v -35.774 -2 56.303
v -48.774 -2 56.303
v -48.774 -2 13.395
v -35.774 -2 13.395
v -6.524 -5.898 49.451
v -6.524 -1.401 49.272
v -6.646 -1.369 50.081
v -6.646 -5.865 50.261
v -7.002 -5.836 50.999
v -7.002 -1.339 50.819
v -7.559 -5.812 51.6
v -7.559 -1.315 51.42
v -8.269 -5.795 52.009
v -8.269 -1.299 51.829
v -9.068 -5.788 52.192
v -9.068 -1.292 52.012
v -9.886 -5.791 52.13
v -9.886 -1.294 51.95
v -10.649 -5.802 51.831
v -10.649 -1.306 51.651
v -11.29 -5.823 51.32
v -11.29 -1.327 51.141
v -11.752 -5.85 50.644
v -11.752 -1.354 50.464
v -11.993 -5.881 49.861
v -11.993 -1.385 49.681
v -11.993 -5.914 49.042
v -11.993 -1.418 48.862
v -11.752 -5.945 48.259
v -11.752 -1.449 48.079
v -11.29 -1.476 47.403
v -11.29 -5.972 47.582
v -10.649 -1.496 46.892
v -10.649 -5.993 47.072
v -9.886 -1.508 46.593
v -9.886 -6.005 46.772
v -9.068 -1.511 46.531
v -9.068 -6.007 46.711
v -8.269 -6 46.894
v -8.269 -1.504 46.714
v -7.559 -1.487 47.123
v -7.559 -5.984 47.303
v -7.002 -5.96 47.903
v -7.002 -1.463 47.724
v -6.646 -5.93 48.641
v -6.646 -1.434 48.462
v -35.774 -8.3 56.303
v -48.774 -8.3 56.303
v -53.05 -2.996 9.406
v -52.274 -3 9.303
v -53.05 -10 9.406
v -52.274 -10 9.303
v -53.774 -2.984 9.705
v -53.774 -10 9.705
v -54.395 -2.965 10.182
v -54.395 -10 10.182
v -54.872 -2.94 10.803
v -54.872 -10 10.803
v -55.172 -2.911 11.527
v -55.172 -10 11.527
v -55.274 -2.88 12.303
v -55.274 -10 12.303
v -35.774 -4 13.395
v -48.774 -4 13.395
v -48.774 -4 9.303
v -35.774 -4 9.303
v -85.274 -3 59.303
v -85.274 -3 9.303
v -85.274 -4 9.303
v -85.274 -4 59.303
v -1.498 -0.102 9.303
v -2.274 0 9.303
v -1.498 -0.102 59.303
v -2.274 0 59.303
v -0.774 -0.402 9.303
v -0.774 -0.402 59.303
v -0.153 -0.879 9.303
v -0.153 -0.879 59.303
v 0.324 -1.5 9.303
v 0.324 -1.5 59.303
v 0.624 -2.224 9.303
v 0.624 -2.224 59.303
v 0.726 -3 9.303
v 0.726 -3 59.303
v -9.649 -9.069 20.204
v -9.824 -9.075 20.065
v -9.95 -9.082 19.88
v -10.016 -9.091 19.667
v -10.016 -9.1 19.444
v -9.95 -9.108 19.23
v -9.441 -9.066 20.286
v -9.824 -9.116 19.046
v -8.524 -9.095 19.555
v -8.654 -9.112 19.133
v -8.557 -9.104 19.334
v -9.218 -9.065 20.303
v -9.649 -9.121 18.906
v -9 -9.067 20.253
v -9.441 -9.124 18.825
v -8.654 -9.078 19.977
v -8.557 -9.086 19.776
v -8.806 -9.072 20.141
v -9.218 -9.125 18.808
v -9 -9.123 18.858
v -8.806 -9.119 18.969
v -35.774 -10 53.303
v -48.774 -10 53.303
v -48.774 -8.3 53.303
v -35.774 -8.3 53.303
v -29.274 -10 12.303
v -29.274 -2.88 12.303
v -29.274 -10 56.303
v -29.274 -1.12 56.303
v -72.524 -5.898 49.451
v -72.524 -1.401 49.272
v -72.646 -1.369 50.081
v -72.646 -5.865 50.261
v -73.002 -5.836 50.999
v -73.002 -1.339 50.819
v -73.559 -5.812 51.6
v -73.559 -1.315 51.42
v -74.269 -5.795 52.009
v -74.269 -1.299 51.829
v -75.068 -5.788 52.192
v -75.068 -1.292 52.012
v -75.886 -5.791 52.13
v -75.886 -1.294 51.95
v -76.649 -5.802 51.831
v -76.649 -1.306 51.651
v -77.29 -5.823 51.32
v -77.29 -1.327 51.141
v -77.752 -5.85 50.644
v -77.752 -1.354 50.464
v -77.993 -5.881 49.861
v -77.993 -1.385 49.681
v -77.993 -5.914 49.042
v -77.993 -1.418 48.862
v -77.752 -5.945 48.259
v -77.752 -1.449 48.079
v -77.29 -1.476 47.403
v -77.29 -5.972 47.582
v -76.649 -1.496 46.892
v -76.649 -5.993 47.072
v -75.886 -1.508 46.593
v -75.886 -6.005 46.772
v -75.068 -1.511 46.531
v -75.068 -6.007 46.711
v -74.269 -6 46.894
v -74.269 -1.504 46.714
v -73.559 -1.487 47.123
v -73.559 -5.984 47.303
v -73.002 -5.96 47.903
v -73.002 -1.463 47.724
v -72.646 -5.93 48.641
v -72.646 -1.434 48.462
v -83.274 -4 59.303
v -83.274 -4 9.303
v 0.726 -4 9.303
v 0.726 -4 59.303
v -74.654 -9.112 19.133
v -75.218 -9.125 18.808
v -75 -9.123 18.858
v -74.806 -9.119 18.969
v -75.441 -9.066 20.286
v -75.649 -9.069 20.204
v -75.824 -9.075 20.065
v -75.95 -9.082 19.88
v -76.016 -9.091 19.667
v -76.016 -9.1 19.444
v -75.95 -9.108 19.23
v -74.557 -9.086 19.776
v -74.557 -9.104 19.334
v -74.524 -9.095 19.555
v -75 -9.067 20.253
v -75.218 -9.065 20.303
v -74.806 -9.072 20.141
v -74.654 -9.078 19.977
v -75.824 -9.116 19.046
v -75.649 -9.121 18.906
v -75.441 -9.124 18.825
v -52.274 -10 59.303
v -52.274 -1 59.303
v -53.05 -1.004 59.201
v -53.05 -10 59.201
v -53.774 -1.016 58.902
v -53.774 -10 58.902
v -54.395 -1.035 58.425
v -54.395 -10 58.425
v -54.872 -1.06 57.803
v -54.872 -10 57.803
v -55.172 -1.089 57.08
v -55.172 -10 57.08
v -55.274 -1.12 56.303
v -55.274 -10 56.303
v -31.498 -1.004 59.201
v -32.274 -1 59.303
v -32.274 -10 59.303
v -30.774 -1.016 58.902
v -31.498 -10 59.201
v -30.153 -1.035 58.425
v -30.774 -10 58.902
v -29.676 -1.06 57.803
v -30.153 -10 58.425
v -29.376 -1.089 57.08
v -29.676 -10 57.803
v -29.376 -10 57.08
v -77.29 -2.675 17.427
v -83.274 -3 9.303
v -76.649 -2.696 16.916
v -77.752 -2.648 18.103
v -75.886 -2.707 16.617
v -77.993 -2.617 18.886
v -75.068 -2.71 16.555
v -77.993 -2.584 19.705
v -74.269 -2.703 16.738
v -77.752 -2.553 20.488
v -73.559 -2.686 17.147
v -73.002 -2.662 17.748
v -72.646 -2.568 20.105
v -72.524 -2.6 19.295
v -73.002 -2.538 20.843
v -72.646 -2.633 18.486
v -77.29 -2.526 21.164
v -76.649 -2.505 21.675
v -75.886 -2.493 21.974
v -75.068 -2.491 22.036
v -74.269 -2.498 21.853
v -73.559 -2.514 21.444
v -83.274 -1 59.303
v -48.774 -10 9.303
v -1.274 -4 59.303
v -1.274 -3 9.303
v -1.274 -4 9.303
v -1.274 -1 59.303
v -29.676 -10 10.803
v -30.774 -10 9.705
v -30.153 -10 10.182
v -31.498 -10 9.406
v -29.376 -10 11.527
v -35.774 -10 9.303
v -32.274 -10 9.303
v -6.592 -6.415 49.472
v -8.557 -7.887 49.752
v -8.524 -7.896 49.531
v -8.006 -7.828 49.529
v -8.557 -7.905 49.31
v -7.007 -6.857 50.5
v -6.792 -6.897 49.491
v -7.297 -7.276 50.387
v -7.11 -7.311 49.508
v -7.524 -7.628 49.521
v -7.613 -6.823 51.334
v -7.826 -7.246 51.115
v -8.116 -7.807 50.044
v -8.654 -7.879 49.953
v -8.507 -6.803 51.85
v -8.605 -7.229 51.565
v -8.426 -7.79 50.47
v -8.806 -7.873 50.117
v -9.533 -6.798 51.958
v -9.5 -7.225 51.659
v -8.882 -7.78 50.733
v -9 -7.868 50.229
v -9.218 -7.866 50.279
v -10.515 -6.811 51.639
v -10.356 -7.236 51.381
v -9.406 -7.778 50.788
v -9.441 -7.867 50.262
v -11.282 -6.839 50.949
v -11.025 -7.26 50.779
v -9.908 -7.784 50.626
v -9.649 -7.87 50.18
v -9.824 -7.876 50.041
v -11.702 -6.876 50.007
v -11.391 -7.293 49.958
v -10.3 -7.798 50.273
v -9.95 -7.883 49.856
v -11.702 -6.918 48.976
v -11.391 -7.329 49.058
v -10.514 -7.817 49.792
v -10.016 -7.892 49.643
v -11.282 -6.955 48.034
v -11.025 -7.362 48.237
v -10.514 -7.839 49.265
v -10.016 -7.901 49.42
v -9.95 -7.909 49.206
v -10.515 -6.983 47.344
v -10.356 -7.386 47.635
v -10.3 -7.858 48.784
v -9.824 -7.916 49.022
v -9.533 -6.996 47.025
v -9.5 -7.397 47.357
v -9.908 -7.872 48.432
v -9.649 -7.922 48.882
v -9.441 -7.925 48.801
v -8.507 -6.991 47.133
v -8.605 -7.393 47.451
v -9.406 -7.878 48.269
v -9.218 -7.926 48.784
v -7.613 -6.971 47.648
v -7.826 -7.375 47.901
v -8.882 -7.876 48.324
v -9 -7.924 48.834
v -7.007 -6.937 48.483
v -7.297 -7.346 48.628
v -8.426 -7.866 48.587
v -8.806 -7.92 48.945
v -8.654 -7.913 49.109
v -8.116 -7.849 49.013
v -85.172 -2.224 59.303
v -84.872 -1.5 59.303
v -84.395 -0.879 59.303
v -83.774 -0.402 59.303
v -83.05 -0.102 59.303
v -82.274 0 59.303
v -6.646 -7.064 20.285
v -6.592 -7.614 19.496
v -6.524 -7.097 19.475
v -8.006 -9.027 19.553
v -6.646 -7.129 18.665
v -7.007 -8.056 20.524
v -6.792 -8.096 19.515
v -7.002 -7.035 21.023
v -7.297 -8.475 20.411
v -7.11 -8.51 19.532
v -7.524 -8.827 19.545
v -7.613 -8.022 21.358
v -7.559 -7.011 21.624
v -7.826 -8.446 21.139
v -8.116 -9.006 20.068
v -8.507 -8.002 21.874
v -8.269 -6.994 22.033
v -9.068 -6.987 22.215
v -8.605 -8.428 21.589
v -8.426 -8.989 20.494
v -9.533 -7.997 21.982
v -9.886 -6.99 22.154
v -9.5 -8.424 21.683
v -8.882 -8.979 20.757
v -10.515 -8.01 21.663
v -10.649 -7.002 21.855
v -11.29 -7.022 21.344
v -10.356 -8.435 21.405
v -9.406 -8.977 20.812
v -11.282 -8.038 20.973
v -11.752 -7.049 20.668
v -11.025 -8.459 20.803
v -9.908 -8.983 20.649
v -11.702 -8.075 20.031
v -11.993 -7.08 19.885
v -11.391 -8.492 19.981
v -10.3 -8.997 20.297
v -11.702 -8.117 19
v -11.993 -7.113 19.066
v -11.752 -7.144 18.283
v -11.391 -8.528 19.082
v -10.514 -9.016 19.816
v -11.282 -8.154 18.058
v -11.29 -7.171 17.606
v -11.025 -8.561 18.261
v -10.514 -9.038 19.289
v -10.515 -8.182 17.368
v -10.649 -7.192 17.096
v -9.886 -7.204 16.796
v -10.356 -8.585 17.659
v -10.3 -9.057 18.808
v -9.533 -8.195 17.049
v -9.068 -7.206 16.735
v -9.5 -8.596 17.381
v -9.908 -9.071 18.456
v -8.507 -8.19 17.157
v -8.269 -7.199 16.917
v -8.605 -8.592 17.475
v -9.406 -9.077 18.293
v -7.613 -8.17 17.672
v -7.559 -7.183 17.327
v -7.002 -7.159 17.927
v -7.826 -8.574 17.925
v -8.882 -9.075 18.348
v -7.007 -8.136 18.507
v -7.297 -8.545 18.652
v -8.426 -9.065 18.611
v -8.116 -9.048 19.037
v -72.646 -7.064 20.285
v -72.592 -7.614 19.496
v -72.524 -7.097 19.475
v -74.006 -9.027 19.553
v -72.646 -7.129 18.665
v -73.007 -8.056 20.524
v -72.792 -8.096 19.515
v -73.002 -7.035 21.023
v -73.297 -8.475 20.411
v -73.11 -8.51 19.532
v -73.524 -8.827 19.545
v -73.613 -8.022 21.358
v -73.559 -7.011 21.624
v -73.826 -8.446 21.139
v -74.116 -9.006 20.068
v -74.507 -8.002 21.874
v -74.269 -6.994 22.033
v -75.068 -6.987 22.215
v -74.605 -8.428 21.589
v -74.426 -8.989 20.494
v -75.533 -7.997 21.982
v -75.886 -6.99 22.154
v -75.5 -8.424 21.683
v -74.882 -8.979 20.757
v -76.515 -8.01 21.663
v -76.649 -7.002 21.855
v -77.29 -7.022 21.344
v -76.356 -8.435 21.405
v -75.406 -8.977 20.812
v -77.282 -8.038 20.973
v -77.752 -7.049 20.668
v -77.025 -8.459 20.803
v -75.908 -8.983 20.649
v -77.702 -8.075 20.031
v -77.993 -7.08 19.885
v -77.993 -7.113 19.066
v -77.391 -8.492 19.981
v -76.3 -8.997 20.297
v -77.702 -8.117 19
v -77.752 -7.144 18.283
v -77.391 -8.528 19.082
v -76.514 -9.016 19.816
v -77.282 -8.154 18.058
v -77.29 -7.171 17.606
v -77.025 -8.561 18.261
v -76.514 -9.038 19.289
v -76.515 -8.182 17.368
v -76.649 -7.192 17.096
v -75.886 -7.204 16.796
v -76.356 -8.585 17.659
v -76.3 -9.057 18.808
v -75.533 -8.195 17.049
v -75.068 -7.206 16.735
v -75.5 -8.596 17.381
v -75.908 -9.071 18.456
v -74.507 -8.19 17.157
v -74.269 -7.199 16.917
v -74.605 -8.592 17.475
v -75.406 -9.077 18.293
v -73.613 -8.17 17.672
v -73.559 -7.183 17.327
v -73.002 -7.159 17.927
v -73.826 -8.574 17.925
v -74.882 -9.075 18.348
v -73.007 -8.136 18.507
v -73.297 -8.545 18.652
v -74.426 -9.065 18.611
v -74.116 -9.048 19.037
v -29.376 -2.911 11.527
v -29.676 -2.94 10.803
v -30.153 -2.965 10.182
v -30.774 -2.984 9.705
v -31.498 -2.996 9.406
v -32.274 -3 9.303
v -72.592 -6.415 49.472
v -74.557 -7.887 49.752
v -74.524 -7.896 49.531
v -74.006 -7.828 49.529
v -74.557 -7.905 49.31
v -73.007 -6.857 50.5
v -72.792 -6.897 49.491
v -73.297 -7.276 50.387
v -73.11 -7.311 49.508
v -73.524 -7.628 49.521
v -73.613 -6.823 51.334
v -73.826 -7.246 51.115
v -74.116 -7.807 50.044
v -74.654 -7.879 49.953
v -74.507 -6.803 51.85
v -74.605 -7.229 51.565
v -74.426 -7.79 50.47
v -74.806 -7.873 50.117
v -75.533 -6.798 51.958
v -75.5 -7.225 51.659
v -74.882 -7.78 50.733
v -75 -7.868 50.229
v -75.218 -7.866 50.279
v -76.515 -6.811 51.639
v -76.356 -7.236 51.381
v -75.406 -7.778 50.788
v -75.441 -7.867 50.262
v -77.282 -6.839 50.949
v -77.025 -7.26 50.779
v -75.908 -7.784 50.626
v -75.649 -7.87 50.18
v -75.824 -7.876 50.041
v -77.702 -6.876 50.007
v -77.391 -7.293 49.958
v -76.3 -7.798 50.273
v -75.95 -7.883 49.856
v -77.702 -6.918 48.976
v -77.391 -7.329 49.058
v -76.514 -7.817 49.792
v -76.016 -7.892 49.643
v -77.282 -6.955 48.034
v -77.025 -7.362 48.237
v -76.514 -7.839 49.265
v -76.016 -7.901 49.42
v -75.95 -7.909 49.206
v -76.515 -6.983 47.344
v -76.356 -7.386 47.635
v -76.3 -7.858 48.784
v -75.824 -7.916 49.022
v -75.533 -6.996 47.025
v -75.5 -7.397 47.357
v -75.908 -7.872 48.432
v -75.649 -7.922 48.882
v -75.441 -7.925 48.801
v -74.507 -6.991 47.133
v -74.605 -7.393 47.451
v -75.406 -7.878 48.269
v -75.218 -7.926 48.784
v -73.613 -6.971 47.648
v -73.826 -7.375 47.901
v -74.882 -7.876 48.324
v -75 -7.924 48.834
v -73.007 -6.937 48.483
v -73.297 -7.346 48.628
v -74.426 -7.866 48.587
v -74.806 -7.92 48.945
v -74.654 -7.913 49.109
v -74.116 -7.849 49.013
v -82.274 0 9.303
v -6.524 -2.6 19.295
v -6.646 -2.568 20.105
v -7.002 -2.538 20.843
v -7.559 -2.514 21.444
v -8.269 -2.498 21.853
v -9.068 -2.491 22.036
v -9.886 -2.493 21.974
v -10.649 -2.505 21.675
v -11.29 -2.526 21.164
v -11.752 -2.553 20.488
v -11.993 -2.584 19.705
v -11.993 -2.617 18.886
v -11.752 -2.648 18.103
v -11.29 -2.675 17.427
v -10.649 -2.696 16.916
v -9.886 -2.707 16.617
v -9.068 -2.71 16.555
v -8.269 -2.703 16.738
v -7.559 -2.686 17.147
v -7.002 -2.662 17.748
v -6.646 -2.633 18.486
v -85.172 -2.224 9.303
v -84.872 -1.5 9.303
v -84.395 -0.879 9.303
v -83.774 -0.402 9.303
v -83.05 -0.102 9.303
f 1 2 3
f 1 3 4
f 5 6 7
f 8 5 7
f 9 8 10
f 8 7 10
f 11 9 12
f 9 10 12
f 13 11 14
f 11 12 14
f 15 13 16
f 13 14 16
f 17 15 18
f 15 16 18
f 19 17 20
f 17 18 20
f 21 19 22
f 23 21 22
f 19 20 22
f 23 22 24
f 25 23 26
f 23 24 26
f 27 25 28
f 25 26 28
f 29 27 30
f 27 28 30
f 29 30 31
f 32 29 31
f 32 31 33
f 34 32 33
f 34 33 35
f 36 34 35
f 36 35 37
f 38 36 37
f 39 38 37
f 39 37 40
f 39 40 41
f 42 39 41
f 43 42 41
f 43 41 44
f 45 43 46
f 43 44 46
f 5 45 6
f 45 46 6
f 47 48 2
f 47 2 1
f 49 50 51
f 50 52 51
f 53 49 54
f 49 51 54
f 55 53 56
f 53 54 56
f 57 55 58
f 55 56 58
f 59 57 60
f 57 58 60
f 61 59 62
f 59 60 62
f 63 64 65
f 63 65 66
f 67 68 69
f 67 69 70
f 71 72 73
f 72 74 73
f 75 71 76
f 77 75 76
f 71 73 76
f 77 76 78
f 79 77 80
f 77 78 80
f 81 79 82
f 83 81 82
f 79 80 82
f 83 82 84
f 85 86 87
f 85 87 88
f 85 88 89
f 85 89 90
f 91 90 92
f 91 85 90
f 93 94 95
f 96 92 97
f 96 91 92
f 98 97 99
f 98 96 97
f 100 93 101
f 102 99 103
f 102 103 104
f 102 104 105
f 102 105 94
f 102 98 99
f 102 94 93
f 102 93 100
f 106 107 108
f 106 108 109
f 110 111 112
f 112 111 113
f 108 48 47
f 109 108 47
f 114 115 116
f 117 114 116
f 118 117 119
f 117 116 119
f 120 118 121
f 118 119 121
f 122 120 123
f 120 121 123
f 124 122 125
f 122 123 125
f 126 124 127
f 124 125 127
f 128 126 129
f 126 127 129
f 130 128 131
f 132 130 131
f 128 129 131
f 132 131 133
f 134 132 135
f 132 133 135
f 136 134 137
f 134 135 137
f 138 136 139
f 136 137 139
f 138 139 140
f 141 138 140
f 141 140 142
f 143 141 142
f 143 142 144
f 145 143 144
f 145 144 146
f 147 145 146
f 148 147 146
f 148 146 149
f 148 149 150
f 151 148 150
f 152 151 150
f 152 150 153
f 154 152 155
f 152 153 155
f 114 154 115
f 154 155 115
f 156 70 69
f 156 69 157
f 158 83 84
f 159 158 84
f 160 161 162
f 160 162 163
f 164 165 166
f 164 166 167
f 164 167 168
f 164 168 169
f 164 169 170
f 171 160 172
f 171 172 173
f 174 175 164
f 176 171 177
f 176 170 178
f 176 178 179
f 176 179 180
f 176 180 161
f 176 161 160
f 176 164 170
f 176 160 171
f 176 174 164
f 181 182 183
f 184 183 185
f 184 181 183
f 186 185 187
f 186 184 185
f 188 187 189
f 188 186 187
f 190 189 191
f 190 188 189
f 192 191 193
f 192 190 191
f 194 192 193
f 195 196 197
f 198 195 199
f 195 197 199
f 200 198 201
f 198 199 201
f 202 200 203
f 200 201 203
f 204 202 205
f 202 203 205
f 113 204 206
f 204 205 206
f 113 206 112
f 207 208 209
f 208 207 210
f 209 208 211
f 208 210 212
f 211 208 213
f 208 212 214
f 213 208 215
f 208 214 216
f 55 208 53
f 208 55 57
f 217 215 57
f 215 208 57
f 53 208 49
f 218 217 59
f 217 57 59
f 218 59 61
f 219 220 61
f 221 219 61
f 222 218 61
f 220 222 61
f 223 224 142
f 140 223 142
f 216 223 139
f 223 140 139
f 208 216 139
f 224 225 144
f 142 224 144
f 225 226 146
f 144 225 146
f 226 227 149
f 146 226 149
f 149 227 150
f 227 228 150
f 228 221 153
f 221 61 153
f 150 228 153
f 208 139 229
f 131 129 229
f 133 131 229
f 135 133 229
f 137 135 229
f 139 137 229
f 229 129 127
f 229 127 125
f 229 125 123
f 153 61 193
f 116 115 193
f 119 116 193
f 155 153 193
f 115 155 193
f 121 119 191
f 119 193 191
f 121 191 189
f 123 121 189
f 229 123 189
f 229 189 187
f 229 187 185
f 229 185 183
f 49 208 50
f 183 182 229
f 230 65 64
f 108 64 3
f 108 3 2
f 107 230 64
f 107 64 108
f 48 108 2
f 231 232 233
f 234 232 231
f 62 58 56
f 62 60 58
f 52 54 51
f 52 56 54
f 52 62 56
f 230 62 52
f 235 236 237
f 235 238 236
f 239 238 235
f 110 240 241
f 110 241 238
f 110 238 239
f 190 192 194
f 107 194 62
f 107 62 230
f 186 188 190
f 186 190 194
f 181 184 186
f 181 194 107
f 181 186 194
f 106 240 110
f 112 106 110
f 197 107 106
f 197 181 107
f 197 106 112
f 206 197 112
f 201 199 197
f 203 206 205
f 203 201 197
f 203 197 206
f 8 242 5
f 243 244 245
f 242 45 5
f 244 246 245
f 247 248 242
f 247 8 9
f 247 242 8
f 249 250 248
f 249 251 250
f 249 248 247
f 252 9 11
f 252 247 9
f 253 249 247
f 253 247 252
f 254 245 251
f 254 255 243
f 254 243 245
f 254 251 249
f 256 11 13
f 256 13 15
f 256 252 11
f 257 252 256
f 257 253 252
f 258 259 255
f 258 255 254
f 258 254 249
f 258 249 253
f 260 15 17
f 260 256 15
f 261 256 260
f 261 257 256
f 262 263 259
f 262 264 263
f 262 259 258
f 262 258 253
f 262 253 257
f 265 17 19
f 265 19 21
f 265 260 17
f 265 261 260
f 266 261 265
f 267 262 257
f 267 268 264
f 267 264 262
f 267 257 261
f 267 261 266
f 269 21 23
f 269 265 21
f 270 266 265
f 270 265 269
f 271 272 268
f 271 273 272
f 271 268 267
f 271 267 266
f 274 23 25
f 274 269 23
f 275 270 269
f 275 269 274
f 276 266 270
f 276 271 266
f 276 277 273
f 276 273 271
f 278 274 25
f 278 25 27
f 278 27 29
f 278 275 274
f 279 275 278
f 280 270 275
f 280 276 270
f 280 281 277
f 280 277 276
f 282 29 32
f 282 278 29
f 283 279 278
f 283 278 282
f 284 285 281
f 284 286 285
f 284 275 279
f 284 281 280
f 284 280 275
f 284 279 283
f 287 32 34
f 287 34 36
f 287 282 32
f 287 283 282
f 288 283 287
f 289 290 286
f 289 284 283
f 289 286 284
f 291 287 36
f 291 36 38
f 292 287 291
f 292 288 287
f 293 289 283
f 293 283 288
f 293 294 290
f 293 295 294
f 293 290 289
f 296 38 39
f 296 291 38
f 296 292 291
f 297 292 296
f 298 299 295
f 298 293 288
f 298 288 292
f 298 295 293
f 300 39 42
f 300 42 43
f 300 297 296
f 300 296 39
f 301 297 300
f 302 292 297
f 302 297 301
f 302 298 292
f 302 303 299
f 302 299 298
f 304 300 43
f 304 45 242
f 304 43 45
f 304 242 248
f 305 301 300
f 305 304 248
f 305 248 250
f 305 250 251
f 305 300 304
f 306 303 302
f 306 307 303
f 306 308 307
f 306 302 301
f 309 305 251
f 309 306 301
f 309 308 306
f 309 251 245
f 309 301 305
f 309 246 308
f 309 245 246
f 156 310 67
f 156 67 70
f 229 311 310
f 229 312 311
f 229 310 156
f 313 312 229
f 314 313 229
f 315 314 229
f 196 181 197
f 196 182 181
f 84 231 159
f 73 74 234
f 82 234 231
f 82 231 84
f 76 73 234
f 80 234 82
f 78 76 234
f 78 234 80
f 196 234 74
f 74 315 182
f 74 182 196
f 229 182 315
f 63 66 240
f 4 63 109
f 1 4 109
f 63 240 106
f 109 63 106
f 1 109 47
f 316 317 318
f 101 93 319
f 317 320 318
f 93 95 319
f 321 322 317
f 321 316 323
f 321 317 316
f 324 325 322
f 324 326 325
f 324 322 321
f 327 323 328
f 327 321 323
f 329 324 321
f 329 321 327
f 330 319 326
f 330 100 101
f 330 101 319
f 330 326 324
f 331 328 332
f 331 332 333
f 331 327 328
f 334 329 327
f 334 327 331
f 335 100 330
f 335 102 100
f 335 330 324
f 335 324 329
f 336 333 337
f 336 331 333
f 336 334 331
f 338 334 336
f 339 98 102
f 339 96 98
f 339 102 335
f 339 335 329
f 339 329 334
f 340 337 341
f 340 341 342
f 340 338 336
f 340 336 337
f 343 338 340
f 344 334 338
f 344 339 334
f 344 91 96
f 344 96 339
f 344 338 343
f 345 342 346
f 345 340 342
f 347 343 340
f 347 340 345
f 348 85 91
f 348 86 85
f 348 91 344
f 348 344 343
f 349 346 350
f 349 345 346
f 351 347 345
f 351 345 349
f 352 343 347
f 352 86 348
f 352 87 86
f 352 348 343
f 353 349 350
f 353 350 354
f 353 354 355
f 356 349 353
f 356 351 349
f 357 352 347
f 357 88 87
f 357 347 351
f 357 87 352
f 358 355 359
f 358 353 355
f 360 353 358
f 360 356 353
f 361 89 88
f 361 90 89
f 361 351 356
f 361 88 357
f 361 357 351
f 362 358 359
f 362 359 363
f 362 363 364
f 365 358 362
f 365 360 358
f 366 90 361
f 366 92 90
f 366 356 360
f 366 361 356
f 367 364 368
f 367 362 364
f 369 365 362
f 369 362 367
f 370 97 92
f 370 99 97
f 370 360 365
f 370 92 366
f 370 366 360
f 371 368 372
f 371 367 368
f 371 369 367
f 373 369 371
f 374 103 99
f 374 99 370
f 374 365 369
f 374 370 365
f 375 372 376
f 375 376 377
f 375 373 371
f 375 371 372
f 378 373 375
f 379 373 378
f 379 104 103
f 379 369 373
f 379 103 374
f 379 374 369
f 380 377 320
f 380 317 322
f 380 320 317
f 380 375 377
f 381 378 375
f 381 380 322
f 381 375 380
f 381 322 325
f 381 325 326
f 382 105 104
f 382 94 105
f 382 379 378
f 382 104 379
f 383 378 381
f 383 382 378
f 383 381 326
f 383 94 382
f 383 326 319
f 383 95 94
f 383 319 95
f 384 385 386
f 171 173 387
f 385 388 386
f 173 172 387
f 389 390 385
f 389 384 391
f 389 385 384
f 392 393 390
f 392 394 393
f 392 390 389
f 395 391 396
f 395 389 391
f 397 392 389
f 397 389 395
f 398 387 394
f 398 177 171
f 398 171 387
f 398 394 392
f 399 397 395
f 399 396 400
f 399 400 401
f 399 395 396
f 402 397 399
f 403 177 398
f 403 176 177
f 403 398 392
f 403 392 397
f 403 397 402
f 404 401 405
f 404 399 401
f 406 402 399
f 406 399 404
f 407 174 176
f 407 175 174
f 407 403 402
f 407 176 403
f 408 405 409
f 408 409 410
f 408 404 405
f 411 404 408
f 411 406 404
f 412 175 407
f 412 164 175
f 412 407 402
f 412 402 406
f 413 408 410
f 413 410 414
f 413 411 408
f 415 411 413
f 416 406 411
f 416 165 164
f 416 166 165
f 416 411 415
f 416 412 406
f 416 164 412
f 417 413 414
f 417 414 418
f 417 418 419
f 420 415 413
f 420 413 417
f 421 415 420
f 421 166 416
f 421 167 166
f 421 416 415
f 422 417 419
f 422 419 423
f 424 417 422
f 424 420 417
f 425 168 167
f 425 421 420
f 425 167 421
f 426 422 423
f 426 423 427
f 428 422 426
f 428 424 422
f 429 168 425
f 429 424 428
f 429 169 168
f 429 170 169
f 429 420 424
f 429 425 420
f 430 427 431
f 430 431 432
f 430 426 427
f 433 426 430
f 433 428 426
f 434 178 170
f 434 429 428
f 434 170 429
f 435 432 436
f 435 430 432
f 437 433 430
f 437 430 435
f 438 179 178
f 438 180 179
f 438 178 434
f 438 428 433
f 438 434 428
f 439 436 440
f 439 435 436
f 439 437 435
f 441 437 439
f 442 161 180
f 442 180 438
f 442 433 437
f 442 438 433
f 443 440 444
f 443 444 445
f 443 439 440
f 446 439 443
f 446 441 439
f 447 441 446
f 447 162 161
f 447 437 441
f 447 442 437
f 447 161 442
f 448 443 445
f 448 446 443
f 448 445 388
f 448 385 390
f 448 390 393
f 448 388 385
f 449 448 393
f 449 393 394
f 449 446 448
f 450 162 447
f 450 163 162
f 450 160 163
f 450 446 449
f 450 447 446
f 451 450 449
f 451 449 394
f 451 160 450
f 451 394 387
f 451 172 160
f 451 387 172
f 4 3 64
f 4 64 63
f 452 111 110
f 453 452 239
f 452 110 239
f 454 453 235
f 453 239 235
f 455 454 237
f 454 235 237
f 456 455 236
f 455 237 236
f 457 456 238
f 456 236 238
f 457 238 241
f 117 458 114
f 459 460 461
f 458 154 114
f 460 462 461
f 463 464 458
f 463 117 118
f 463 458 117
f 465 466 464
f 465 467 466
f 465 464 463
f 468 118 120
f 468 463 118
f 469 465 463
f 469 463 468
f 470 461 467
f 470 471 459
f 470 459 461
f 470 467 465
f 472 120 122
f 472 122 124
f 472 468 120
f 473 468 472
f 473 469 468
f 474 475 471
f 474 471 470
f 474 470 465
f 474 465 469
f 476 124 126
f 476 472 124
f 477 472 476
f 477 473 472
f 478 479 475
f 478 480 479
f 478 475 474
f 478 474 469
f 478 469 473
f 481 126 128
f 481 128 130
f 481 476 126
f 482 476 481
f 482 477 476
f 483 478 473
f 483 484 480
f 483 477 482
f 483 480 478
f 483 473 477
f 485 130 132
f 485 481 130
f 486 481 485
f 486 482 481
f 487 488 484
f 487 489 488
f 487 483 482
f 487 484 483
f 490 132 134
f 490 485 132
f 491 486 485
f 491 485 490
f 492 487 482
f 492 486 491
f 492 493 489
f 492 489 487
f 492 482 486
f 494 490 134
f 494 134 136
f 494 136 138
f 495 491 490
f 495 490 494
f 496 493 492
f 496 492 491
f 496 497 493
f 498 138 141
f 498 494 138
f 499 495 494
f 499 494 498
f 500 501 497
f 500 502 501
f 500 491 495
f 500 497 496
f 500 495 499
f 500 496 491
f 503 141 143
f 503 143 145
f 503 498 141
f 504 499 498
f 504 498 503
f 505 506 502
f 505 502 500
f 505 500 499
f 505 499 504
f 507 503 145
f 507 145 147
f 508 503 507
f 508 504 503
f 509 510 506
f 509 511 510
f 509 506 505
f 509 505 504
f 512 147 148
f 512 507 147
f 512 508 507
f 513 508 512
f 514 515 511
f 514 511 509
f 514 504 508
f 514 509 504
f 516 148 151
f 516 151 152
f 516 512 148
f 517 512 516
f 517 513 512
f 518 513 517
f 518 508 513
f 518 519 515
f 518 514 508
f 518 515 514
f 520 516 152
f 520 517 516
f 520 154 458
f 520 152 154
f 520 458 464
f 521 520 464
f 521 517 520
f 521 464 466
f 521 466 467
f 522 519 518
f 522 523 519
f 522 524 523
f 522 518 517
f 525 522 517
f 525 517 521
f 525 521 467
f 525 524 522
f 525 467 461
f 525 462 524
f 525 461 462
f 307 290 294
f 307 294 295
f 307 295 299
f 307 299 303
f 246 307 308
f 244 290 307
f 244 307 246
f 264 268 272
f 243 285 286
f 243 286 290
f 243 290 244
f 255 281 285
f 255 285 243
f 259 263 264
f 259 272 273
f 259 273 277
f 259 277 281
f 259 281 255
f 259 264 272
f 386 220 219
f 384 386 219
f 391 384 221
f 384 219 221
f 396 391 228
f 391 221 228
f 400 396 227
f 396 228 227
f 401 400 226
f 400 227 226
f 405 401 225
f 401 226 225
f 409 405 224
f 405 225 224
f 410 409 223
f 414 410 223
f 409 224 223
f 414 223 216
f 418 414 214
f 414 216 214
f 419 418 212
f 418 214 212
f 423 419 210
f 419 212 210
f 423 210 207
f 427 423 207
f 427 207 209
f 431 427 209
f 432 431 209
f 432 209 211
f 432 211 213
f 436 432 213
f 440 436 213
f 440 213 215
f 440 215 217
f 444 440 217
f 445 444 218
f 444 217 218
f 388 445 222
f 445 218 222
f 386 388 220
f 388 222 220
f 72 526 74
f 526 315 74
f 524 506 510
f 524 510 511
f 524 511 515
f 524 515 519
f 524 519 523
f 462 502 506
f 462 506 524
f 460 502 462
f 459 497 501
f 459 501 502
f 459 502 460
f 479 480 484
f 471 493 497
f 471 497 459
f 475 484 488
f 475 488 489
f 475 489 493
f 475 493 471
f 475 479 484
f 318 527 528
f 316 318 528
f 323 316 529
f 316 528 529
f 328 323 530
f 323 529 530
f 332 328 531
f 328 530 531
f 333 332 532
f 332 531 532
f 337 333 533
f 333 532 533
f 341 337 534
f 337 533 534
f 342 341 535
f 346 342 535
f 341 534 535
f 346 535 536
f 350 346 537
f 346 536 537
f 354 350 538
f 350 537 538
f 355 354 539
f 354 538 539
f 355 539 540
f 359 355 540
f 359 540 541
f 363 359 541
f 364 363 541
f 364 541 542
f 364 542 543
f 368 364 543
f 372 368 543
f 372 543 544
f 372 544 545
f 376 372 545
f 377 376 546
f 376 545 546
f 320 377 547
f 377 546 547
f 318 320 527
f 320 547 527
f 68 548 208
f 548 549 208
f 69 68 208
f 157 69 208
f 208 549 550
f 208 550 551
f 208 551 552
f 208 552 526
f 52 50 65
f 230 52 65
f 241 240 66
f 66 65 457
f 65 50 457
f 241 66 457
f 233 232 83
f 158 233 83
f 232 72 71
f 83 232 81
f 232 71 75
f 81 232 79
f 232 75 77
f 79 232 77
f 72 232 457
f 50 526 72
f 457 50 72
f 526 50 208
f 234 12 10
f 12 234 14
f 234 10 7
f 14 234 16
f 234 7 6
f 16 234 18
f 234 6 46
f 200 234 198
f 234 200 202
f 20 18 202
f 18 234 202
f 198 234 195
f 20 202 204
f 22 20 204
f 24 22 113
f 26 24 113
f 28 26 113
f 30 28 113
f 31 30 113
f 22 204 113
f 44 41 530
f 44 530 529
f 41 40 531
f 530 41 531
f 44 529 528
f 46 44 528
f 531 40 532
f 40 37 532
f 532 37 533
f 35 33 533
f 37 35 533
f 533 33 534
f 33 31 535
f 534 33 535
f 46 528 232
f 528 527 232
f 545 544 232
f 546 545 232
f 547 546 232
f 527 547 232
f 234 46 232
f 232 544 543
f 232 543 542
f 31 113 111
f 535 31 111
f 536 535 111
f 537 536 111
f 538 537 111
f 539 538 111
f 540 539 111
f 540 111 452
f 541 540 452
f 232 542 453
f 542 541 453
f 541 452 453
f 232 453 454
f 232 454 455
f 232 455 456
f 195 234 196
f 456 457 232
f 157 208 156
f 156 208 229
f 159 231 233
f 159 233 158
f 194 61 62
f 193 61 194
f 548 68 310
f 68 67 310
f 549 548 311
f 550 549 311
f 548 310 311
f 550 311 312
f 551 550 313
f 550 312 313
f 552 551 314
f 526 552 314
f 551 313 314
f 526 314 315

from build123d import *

# Parameters (mm, degrees)
F0_W      = 86
F0_H      = 50
F1_DEPTH  = 1
F2_W      = 26
F2_H      = 50
F3_DEPTH  = 9
F4_W      = 13
F4_H      = 47
F5_DEPTH  = 8
F6_W      = 13
F6_H      = 4.0918802842
F7_DEPTH  = 2
F8_W      = 13
F8_H      = 1.7
F9_DEPTH  = 3
F11_DEPTH = 28
F13_DEPTH = 28
F14_W     = 2
F14_H     = 50
F15_DEPTH = 3
F16_R     = 3
F17_R     = 2.75
F18_DEPTH = 6.5
F19_R     = 2
F20_R     = 3


with BuildPart() as f1:
    # F0 (on Front) → F1 (new body)
    with BuildSketch(Plane.XZ):
        with Locations((-42.2739830759, 34.3034887686)):
            Rectangle(F0_W, F0_H)
    extrude(amount=F1_DEPTH)

    # F2 (on face) → F3 (join)
    with BuildSketch(Plane.XZ.offset(1)):
        with Locations((-42.2739830759, 34.3034887686)):
            Rectangle(F2_W, F2_H)
    extrude(amount=F3_DEPTH)

    # F4 (on face) → F5 (cut)
    with BuildSketch(Plane.XZ.offset(10)):
        with Locations((-42.2739830759, 32.8034887686)):
            Rectangle(F4_W, F4_H)
    extrude(amount=-F5_DEPTH, mode=Mode.SUBTRACT)

    # F6 (on face) → F7 (join)
    with BuildSketch(Plane.XZ.offset(2)):
        with Locations((-42.2739830759, 11.3494289108)):
            Rectangle(F6_W, F6_H)
    extrude(amount=F7_DEPTH)

    # F8 (on face) → F9 (join)
    with BuildSketch(Plane(origin=(0, 0, 56.3034887686), x_dir=(1, 0, 0), z_dir=(0, 0, -1))):
        with Locations((-42.2739830759, 9.15)):
            Rectangle(F8_W, F8_H)
    extrude(amount=F9_DEPTH)

    # F10 (on face) → F11 (join)
    with BuildSketch(Plane(origin=(-55.2739830759, 0, 0), x_dir=(0, -1, 0), z_dir=(-1, 0, 0))):
        Polygon((3, 9.3034887686), (1, 59.3034887686), (1, 9.3034887686), align=None)
    extrude(amount=F11_DEPTH)

    # F12 (on face) → F13 (join)
    with BuildSketch(Plane.YZ.offset(-29.2739830759)):
        Polygon((-1, 9.3034887686), (-1, 59.3034887686), (-3, 9.3034887686), align=None)
    extrude(amount=F13_DEPTH)

    # F14 (on face) → F15 (join)
    with BuildSketch(Plane.XZ.offset(1)):
        with Locations((-0.2739830759, 34.3034887686)):
            Rectangle(F14_W, F14_H)
        with Locations((-84.2739830759, 34.3034887686)):
            Rectangle(F14_W, F14_H)
    extrude(amount=F15_DEPTH)

    # F16
    f16_edges = [f1.edges().sort_by_distance(p)[0] for p in [
        (-85.273983, 0, 34.303489),
        (0.726017, 0, 34.303489),
    ]]
    fillet(f16_edges, radius=F16_R)

    # F17 (on face) → F18 (join)
    with BuildSketch(Plane(origin=(0, -3.3667527464, 0.1346701099), x_dir=(1, 0, 0), z_dir=(0, -0.9992009587, 0.0399680383))):
        with Locations((-9.2739830759, 49.176150782)):
            Circle(F17_R)
        with Locations((-9.2739830759, 19.176150782)):
            Circle(F17_R)
        with Locations((-75.2739830759, 49.176150782)):
            Circle(F17_R)
        with Locations((-75.2739830759, 19.176150782)):
            Circle(F17_R)
    extrude(amount=F18_DEPTH)

    # F19
    f19_edges = [f1.edges().sort_by_distance(p)[0] for p in [
        (-78.023983, -7.896085, 49.531319),
        (-78.023983, -9.095126, 19.555291),
        (-12.023983, -7.896085, 49.531319),
        (-12.023983, -9.095126, 19.555291),
    ]]
    fillet(f19_edges, radius=F19_R)

    # F20
    f20_edges = [f1.edges().sort_by_distance(p)[0] for p in [
        (-29.273983, -5.5, 59.303489),
        (-55.273983, -5.5, 59.303489),
        (-29.273983, -6.5, 9.303489),
        (-55.273983, -6.5, 9.303489),
    ]]
    fillet(f20_edges, radius=F20_R)


solid = f1.part
